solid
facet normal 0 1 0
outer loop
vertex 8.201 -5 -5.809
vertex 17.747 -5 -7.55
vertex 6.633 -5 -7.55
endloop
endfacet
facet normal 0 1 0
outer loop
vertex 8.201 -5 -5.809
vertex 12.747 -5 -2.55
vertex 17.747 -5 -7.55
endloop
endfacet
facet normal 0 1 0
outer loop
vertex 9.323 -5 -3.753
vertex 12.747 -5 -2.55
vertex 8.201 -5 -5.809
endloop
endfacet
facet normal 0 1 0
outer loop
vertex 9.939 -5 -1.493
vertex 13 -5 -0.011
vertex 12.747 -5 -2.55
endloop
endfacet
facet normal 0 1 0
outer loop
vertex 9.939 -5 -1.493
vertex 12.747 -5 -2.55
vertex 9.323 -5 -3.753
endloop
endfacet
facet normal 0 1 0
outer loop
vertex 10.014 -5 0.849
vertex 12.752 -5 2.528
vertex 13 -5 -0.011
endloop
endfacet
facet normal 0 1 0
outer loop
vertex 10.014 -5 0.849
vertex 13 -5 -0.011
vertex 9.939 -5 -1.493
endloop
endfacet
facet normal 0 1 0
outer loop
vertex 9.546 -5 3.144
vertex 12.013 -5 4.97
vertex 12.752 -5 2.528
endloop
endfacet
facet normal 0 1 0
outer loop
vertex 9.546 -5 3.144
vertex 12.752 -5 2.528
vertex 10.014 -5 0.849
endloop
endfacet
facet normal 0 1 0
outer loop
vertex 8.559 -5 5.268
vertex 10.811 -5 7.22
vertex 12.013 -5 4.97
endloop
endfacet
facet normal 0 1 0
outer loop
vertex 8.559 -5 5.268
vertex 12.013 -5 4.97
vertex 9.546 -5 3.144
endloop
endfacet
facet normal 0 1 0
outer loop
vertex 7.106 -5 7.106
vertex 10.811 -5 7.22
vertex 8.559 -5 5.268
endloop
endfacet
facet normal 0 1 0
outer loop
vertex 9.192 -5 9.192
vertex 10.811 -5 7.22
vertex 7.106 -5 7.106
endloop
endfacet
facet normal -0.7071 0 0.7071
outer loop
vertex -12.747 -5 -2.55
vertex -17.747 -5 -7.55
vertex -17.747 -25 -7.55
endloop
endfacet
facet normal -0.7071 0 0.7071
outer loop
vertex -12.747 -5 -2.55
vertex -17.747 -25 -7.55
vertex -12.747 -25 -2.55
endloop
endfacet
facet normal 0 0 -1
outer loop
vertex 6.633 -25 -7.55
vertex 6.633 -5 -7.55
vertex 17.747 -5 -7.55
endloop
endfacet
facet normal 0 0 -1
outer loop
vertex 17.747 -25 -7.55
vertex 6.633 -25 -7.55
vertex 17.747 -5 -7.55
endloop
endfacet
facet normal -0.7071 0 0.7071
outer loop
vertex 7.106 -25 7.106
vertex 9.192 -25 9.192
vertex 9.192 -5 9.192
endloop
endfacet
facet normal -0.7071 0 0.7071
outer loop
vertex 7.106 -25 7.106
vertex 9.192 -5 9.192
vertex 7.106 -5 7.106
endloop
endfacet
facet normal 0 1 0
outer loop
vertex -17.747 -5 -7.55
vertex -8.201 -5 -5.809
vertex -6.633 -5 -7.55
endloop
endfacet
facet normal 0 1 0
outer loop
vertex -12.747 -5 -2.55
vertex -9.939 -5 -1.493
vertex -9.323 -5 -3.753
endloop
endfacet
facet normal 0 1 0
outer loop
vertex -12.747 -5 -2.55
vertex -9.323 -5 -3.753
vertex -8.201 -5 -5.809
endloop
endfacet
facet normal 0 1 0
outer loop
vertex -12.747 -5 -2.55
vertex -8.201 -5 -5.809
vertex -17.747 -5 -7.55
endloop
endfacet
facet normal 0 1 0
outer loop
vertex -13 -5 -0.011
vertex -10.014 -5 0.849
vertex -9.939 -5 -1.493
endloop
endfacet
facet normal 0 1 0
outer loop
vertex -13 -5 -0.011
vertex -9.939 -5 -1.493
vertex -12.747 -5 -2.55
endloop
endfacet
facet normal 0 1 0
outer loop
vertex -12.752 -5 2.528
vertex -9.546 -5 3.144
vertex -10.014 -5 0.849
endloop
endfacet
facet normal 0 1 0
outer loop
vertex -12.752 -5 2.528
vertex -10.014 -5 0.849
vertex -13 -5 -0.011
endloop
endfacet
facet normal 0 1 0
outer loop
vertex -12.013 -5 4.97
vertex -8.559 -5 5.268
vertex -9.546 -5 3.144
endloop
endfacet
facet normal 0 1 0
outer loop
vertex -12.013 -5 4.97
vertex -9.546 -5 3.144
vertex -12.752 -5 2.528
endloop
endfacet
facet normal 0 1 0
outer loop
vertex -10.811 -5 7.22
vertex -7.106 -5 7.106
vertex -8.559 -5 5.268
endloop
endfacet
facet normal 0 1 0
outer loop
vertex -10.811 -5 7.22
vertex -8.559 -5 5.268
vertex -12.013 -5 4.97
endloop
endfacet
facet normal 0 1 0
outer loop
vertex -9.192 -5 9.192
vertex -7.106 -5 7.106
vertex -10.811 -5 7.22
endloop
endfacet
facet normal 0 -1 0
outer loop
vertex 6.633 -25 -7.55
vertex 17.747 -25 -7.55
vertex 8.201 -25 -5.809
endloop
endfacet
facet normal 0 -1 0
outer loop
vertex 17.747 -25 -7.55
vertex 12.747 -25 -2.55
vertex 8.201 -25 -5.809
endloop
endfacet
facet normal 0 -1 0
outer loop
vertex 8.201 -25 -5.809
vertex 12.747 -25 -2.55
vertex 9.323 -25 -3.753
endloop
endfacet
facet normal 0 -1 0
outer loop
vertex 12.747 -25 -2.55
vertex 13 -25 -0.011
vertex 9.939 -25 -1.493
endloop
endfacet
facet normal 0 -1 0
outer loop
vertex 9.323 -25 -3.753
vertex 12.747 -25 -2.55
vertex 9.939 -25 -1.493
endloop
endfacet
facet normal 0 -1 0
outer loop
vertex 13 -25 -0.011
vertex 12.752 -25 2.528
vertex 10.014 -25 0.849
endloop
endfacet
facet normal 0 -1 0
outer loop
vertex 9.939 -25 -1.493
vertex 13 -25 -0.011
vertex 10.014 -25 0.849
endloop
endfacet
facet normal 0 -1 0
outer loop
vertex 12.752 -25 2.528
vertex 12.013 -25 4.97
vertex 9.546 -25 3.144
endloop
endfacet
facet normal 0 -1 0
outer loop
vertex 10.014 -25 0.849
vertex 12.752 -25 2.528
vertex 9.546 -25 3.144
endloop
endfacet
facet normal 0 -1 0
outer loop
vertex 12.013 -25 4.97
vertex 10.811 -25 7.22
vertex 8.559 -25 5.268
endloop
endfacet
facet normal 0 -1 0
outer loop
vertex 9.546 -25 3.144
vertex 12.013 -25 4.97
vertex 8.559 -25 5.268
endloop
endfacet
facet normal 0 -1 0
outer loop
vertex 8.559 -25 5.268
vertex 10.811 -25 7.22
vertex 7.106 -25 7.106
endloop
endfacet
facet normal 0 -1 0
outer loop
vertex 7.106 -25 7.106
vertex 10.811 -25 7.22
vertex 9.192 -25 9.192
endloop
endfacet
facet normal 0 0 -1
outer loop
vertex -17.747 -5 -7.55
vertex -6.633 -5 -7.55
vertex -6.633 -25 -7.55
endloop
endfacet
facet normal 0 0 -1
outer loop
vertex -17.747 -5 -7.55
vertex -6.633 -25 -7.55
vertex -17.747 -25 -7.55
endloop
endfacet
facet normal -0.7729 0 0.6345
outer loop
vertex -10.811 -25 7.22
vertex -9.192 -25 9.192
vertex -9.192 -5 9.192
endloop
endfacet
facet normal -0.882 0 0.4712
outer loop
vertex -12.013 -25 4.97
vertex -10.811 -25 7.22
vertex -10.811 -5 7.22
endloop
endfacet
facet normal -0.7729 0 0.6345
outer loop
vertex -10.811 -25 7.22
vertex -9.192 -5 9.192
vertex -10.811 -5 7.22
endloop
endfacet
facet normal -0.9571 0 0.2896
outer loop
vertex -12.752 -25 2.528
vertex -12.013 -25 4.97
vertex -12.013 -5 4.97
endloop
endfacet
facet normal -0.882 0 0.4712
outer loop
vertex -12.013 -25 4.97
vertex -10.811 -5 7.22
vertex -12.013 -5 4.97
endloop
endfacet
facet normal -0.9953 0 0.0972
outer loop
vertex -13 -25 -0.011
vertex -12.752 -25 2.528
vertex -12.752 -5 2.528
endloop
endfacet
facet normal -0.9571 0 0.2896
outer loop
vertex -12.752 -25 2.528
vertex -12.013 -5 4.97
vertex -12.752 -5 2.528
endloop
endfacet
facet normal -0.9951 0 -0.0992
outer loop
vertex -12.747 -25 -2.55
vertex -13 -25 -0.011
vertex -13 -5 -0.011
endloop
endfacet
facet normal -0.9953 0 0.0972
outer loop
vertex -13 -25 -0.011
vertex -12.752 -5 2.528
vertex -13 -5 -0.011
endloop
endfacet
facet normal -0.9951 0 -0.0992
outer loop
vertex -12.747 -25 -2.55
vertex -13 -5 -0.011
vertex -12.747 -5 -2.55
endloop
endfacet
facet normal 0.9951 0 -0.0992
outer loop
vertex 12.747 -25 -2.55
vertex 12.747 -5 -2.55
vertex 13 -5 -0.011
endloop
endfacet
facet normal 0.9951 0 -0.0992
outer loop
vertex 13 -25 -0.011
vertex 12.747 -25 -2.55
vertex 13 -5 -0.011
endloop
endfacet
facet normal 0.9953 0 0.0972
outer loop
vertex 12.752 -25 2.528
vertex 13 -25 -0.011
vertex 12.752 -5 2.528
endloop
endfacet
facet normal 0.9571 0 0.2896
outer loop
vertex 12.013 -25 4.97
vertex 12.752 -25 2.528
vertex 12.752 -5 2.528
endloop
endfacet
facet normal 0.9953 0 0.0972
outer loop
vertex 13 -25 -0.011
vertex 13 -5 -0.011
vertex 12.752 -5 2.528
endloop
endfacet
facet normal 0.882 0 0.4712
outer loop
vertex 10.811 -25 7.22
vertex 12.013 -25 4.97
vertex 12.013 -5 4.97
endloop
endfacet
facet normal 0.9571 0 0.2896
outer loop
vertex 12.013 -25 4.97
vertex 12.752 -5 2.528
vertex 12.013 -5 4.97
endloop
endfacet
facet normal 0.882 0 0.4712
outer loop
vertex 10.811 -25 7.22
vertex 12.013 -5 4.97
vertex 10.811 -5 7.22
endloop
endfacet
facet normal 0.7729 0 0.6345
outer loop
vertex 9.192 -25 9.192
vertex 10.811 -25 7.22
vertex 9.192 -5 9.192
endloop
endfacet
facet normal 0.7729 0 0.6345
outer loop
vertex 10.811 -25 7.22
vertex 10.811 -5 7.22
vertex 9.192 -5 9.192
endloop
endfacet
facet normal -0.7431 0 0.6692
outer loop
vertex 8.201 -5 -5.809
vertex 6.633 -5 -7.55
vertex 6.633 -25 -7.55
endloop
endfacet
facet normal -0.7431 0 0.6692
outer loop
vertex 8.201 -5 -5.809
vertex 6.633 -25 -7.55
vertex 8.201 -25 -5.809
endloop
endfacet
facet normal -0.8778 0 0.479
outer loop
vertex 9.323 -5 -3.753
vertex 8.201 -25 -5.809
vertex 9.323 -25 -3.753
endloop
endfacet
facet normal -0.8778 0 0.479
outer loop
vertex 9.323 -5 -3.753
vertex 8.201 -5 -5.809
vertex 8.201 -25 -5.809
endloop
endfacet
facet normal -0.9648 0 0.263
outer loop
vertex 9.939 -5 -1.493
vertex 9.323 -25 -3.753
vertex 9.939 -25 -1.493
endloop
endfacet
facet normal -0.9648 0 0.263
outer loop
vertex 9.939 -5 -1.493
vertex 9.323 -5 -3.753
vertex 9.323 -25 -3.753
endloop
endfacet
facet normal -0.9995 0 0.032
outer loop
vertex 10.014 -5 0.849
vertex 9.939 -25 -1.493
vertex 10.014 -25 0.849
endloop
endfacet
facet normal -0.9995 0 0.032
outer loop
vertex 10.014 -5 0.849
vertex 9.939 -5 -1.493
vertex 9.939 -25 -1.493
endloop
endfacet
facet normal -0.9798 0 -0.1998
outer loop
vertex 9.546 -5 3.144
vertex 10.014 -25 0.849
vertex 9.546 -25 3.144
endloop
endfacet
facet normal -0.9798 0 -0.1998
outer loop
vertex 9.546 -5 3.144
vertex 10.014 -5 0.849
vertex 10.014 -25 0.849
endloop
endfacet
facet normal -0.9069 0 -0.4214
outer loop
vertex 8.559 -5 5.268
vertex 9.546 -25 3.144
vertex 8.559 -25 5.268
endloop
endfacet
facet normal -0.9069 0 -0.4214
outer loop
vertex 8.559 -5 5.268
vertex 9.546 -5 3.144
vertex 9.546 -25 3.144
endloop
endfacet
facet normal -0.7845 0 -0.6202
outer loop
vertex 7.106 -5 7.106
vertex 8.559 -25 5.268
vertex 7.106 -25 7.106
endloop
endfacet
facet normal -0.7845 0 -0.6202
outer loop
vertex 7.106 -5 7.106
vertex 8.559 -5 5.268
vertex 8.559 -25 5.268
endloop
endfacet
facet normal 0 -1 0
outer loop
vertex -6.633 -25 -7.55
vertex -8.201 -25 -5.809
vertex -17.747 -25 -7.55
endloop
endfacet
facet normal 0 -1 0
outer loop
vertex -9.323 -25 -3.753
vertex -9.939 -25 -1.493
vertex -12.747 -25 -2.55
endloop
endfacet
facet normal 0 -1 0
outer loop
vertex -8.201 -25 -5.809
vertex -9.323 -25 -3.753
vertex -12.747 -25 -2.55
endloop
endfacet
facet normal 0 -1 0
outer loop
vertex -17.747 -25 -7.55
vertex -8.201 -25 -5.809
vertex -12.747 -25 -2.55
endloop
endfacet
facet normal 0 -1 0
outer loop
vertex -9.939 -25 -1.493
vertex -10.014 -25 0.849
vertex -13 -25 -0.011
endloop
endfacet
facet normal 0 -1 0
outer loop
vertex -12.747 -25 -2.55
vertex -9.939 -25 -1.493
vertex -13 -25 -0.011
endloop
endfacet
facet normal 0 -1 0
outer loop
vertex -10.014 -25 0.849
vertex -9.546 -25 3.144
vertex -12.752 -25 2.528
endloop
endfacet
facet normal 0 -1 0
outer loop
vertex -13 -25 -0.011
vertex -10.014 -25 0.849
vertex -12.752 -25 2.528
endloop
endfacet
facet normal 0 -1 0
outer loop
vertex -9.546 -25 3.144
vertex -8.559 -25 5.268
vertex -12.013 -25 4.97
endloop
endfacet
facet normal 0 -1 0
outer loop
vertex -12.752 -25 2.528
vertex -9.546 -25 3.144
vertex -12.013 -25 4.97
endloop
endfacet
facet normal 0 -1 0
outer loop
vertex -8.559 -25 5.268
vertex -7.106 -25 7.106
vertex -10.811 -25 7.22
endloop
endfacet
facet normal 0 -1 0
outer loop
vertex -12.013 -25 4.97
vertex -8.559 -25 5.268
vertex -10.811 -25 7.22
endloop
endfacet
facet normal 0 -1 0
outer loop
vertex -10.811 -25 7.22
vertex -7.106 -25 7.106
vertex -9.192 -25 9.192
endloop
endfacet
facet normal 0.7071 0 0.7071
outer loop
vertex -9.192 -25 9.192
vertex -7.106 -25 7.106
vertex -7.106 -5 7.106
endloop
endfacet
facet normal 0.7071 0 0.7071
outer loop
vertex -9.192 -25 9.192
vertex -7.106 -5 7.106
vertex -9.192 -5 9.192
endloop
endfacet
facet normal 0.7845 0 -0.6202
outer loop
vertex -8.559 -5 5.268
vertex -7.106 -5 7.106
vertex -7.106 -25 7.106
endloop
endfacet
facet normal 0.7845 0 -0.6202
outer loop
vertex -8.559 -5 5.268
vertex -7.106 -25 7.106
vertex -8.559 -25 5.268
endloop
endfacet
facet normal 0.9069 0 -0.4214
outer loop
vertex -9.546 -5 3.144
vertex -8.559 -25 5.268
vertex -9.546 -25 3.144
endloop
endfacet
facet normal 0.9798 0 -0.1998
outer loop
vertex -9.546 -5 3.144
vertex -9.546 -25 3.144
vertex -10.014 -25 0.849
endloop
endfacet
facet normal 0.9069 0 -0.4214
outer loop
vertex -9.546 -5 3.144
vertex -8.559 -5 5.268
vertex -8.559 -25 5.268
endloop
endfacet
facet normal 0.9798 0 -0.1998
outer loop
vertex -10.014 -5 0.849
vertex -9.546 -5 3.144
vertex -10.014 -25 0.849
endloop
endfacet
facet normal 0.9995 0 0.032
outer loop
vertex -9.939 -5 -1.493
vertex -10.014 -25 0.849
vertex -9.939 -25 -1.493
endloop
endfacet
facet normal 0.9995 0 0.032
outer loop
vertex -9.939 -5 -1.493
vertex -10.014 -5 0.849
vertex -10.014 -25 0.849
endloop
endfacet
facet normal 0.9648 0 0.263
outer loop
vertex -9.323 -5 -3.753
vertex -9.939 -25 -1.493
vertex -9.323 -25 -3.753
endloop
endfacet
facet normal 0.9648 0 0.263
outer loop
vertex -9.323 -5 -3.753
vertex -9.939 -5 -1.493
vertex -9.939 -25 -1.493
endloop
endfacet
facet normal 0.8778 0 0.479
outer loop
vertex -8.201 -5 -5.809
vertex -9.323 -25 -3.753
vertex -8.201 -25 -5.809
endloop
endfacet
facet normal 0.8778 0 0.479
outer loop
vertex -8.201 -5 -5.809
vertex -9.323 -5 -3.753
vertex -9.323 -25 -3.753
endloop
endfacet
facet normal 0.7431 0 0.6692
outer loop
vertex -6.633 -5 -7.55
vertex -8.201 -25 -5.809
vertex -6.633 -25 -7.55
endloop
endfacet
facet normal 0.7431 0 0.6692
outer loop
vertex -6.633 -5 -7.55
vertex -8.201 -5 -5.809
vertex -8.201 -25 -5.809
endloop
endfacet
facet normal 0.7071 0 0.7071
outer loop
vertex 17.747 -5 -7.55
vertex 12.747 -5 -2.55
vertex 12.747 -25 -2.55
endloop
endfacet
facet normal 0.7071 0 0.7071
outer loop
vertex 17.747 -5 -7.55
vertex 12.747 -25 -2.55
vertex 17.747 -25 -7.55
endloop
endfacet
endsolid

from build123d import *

# Parameters (mm, degrees)
PAD013_DEPTH = 20
PAD008_DEPTH = 20


with BuildPart() as motorholder_pocket:
    # Sketch017 → Pad013 (new body)
    with BuildSketch(Plane.XZ.offset(5)):
        Polygon((0, 0), (-12, 12), (12, 12), align=None)
    extrude(amount=PAD013_DEPTH)


with BuildPart() as motor_holder_cut:
    # Sketch010 → Pad008 (new body)
    with BuildSketch(Plane.XZ.offset(5)):
        with BuildLine():
            ThreePointArc((-6.63325, 7.55), (-10.05, 0), (-6.63325, -7.55))
            Line((-6.63325, -7.55), (-17.747451, -7.55))
            Line((-17.747451, -7.55), (-12.747451, -2.55))
            ThreePointArc((-6.63325, 11.18034), (-11.87575, 5.288341), (-12.747451, -2.55))
            Line((-2.63325, 11.18034), (-6.63325, 11.18034))
            Line((-2.63325, 7.55), (-2.63325, 11.18034))
            Line((-6.63325, 7.55), (-2.63325, 7.55))
        make_face()
        with BuildLine():
            ThreePointArc((6.63325, -7.55), (10.05, 0), (6.63325, 7.55))
            Line((6.63325, 7.55), (2.63325, 7.55))
            Line((2.63325, 7.55), (2.63325, 11.18034))
            Line((2.63325, 11.18034), (6.63325, 11.18034))
            ThreePointArc((12.747451, -2.55), (11.87575, 5.288341), (6.63325, 11.18034))
            Line((12.747451, -2.55), (17.747451, -7.55))
            Line((6.63325, -7.55), (17.747451, -7.55))
        make_face()
    extrude(amount=PAD008_DEPTH)

    # Cut004: cut motorholder_pocket
    add(motorholder_pocket.part, mode=Mode.SUBTRACT)


solid = motor_holder_cut.part
